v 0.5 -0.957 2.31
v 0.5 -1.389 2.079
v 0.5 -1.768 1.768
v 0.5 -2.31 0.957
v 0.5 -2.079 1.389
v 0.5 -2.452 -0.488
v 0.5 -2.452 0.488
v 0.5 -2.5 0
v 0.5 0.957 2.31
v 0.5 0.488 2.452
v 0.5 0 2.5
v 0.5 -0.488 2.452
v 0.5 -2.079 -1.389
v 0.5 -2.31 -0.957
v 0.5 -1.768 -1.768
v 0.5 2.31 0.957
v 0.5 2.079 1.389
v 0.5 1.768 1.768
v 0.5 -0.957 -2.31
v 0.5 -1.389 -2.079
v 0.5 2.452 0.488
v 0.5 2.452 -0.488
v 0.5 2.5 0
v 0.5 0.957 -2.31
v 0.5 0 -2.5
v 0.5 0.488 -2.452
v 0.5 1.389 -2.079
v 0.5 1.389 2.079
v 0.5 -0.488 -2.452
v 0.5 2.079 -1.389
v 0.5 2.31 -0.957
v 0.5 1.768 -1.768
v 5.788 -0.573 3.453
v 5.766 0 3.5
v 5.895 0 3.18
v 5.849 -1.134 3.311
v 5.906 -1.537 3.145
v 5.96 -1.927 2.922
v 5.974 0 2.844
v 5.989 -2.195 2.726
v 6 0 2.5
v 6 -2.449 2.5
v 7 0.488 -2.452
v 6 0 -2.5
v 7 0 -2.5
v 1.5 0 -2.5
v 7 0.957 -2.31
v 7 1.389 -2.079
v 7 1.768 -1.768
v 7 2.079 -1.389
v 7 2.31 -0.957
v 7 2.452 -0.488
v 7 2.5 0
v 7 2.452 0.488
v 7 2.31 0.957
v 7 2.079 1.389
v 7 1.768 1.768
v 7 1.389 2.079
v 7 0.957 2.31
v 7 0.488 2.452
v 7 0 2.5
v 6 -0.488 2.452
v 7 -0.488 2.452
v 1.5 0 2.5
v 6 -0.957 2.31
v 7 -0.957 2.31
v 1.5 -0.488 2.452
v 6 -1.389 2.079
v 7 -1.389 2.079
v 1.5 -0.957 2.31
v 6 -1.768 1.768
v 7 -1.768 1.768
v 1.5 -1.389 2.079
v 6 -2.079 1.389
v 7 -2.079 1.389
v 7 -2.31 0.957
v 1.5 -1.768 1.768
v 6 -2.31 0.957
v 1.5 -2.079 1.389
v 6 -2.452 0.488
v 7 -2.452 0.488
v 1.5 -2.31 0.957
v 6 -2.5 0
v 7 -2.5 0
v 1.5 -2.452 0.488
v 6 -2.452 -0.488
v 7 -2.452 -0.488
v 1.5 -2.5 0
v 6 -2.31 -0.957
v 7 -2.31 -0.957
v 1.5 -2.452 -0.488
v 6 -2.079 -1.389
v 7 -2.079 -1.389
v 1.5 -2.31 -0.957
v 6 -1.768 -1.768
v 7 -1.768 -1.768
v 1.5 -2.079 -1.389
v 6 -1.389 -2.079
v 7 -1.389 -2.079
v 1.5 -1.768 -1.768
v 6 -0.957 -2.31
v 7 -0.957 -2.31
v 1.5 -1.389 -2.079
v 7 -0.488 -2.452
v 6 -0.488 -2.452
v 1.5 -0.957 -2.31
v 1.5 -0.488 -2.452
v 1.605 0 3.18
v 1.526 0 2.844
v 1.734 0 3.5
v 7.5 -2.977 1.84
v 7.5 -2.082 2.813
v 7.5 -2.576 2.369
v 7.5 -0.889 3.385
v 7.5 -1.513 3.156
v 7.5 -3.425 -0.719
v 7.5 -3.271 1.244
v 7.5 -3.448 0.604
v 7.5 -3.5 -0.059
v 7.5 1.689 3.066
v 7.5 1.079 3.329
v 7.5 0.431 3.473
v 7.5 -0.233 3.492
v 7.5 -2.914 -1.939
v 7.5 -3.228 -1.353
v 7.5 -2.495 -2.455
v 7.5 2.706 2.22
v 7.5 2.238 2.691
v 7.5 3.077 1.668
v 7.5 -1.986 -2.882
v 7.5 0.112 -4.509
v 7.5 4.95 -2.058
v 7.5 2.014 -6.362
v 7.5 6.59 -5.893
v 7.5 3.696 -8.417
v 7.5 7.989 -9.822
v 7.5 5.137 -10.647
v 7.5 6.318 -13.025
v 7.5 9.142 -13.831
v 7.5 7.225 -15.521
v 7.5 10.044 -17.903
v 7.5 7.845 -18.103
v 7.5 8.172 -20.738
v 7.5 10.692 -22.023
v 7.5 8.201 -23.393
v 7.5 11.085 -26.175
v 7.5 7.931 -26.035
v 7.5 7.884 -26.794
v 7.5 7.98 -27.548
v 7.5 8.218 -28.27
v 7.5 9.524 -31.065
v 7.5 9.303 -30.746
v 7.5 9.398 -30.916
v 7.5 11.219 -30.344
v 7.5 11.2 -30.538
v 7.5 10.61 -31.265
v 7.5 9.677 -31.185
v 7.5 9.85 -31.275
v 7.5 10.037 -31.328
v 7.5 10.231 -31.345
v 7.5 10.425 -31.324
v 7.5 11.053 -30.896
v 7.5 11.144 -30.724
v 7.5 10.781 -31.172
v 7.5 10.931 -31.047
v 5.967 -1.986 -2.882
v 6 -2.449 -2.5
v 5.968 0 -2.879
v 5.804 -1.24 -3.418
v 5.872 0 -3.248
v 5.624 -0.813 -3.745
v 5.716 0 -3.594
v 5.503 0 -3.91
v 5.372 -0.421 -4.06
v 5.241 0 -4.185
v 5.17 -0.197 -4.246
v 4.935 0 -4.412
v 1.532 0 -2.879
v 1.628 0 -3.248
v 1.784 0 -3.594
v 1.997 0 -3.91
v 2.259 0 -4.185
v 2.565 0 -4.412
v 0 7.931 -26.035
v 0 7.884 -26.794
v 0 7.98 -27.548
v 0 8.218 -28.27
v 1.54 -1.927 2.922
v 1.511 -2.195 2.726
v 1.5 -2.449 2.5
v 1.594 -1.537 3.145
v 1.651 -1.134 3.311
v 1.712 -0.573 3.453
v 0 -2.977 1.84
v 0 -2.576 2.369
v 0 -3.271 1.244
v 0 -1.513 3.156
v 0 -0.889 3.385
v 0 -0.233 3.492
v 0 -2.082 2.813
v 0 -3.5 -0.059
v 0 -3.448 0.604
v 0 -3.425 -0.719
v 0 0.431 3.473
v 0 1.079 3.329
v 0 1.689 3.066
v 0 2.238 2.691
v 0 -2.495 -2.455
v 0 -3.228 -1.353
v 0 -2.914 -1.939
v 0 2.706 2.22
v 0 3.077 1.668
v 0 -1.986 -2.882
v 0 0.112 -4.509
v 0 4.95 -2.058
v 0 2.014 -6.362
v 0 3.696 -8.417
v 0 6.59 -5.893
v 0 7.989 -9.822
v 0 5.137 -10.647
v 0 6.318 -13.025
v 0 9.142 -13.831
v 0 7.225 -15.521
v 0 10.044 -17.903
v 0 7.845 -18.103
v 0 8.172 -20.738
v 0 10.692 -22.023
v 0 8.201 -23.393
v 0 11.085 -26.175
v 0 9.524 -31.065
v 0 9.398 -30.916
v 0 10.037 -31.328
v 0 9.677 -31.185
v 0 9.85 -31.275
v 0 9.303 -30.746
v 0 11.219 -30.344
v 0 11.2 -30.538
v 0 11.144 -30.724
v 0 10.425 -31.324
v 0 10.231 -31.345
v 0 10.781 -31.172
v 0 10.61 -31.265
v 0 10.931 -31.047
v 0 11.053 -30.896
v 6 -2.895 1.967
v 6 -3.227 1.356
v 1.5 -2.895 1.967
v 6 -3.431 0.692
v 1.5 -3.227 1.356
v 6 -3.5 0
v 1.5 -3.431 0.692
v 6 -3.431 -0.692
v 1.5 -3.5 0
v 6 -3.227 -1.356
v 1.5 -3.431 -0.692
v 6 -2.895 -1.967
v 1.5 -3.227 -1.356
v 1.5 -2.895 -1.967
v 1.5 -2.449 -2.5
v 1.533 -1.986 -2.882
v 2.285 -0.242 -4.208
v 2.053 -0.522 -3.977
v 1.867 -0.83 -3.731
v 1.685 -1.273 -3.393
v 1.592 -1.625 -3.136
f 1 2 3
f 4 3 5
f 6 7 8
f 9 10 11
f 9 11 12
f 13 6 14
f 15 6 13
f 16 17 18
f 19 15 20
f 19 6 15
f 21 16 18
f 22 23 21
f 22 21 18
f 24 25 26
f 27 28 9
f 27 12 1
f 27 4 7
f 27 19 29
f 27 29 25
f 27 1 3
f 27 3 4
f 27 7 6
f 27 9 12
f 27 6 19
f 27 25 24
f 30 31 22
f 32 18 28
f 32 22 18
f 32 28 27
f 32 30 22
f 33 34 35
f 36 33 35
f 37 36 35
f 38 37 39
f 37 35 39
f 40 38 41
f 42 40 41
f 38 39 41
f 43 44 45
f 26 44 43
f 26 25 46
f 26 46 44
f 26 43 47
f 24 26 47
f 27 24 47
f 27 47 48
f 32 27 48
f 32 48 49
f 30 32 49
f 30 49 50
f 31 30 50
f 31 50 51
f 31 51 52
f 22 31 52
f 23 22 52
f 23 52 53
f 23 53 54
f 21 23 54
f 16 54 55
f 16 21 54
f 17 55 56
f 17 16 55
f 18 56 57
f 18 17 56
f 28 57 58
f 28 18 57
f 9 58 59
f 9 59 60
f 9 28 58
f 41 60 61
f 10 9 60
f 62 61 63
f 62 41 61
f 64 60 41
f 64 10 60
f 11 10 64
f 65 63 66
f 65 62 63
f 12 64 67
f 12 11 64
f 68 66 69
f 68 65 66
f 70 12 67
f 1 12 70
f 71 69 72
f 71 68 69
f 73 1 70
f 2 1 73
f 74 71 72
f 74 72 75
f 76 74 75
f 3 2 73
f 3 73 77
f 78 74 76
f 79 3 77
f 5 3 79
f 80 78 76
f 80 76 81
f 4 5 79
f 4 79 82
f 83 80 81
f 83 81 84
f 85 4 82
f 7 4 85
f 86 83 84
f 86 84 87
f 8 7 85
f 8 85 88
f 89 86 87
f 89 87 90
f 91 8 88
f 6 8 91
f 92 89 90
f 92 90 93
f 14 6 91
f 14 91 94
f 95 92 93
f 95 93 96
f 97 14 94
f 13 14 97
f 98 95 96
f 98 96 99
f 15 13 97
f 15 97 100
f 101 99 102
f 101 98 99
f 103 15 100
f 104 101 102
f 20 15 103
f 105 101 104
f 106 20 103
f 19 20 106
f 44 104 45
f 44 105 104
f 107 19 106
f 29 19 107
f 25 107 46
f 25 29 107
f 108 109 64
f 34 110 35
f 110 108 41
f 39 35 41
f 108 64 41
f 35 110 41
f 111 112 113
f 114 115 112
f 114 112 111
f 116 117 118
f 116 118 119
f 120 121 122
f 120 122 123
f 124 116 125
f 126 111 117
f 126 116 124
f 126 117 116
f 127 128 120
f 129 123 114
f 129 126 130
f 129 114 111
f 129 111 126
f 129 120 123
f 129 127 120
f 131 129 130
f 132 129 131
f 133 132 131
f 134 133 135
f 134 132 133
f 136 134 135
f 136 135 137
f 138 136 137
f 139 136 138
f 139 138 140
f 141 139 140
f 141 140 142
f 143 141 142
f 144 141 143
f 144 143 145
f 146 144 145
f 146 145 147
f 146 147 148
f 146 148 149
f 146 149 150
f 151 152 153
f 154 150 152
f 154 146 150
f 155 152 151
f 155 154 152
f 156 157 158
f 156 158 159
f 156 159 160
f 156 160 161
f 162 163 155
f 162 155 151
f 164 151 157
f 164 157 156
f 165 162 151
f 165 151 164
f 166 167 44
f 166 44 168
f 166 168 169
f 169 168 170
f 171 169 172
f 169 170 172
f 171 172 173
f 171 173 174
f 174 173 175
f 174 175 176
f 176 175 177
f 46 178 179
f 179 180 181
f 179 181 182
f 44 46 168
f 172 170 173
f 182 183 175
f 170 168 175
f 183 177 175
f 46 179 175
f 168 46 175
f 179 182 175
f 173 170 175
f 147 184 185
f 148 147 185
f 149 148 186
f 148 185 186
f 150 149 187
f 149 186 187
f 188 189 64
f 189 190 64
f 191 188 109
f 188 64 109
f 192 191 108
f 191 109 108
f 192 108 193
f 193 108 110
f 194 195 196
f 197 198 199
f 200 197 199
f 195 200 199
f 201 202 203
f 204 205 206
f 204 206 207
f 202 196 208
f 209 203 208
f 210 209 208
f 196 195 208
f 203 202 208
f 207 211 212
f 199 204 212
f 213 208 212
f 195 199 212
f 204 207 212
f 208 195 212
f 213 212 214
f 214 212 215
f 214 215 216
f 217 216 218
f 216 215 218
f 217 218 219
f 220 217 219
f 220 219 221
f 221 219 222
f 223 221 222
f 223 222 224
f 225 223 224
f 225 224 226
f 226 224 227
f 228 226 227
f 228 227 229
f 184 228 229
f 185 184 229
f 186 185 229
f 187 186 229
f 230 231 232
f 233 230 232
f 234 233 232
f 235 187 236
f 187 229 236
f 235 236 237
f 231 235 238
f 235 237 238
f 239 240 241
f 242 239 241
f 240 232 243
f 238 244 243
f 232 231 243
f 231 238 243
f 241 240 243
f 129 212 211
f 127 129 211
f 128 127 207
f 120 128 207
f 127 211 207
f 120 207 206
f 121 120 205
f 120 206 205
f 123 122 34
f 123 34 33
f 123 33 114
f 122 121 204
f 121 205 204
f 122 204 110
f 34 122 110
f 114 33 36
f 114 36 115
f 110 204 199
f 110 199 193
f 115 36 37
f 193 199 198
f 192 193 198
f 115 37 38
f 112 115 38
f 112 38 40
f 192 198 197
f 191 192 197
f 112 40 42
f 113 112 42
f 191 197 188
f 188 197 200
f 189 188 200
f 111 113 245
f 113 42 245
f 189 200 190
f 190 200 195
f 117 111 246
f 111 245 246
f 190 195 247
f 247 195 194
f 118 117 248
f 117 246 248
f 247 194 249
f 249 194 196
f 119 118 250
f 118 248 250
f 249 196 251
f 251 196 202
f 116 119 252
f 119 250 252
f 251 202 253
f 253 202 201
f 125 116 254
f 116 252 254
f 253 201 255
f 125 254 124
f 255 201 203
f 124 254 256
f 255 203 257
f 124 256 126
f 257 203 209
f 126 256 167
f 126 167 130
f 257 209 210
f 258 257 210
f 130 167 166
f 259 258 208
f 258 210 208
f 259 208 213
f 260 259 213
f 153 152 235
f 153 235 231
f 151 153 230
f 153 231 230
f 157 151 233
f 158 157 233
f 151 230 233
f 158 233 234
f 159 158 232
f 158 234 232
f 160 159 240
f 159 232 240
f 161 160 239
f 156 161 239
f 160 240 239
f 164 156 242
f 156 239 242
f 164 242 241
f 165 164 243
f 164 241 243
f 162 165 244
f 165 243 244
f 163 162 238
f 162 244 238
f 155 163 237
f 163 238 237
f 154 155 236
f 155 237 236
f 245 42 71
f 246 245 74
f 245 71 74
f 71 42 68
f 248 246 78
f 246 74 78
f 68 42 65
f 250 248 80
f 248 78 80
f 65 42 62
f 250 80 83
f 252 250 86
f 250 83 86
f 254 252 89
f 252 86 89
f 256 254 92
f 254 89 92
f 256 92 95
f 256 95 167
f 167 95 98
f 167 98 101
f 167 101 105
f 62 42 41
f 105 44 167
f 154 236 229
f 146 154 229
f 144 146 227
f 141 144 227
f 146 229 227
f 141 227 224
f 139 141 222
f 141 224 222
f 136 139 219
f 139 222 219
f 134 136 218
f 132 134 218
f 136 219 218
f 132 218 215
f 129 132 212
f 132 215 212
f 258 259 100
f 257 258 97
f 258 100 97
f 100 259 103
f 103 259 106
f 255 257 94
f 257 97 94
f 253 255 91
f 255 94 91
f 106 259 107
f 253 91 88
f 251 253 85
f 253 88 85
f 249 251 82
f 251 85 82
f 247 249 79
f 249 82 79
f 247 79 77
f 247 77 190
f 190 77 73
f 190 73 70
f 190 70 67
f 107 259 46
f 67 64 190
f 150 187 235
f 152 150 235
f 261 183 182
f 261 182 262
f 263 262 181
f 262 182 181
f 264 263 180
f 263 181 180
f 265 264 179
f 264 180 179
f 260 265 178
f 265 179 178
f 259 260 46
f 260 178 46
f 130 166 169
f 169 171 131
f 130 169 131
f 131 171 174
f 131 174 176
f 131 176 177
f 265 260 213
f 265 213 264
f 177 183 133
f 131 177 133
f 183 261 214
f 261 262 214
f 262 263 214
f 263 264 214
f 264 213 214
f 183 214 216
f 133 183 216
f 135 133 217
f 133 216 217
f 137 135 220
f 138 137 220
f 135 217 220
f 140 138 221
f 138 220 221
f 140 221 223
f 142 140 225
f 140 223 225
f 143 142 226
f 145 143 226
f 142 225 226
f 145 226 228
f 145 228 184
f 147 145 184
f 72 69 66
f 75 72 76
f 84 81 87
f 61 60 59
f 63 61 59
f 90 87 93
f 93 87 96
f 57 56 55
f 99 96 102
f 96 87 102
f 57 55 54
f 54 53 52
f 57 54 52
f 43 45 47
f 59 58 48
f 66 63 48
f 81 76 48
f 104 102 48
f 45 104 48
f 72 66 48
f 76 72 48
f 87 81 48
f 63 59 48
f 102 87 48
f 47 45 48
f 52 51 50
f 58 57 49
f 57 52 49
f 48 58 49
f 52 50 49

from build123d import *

# Parameters (mm, degrees)
SKETCH4_R           = 2.5
BOSS_EXTRUDE2_DEPTH = 7.5
CUT_EXTRUDE1_DEPTH  = 35.126684354
SKETCH4_4_R         = 2.5
BOSS_EXTRUDE4_DEPTH = 0.5
BOSS_EXTRUDE5_START = 7
SKETCH4_5_R         = 2.5
BOSS_EXTRUDE5_DEPTH = 0.5


with BuildPart() as part:
    # Sketch4 → Boss-Extrude2 (new body)
    with BuildSketch(Plane(origin=(0, 0, 0), x_dir=(0, 0, -1), z_dir=(1, 0, 0))):
        with BuildLine():
            Line((28.269557121, 8.217760269), (30.746429201, 9.303054261))
            ThreePointArc((30.746429201, 9.303054261), (31.323725134, 10.424611444), (30.343861951, 11.218984941))
            ThreePointArc((30.343861951, 11.218984941), (13.830620655, 9.141504786), (-1.66846042, 3.076725504))
            ThreePointArc((-1.66846042, 3.076725504), (-2.603150363, -2.33957436), (2.881836513, -1.986207016))
            ThreePointArc((2.881836513, -1.986207016), (13.025423778, 6.31803392), (26.035044154, 7.931278408))
            ThreePointArc((26.035044154, 7.931278408), (27.172885501, 7.913960675), (28.269557121, 8.217760269))
        make_face()
        Circle(SKETCH4_R, mode=Mode.SUBTRACT)
    extrude(amount=BOSS_EXTRUDE2_DEPTH)

    # Sketch5 → Cut-Extrude1 (cut, through all)
    with BuildSketch(Plane(origin=(0, 0, 0), x_dir=(1, 0, 0), z_dir=(0, 1, 0))):
        with BuildLine():
            Line((1.5, 2.5), (1.5, -2.5))
            ThreePointArc((1.5, -2.5), (3.75, -4.75), (6, -2.5))
            Line((6, -2.5), (6, 2.5))
            ThreePointArc((6, 2.5), (3.75, 4.75), (1.5, 2.5))
        make_face()
    extrude(amount=-CUT_EXTRUDE1_DEPTH, mode=Mode.SUBTRACT)

    # Sketch4<4> → Boss-Extrude4 (add)
    with BuildSketch(Plane(origin=(0, 0, 0), x_dir=(0, 0, -1), z_dir=(1, 0, 0))):
        Circle(SKETCH4_4_R)
    extrude(amount=BOSS_EXTRUDE4_DEPTH)

    # Sketch4<5> → Boss-Extrude5 (add)
    with BuildSketch(Plane(origin=(0, 0, 0), x_dir=(0, 0, -1), z_dir=(1, 0, 0)).offset(BOSS_EXTRUDE5_START)):
        Circle(SKETCH4_5_R)
    extrude(amount=BOSS_EXTRUDE5_DEPTH)


solid = part.part
